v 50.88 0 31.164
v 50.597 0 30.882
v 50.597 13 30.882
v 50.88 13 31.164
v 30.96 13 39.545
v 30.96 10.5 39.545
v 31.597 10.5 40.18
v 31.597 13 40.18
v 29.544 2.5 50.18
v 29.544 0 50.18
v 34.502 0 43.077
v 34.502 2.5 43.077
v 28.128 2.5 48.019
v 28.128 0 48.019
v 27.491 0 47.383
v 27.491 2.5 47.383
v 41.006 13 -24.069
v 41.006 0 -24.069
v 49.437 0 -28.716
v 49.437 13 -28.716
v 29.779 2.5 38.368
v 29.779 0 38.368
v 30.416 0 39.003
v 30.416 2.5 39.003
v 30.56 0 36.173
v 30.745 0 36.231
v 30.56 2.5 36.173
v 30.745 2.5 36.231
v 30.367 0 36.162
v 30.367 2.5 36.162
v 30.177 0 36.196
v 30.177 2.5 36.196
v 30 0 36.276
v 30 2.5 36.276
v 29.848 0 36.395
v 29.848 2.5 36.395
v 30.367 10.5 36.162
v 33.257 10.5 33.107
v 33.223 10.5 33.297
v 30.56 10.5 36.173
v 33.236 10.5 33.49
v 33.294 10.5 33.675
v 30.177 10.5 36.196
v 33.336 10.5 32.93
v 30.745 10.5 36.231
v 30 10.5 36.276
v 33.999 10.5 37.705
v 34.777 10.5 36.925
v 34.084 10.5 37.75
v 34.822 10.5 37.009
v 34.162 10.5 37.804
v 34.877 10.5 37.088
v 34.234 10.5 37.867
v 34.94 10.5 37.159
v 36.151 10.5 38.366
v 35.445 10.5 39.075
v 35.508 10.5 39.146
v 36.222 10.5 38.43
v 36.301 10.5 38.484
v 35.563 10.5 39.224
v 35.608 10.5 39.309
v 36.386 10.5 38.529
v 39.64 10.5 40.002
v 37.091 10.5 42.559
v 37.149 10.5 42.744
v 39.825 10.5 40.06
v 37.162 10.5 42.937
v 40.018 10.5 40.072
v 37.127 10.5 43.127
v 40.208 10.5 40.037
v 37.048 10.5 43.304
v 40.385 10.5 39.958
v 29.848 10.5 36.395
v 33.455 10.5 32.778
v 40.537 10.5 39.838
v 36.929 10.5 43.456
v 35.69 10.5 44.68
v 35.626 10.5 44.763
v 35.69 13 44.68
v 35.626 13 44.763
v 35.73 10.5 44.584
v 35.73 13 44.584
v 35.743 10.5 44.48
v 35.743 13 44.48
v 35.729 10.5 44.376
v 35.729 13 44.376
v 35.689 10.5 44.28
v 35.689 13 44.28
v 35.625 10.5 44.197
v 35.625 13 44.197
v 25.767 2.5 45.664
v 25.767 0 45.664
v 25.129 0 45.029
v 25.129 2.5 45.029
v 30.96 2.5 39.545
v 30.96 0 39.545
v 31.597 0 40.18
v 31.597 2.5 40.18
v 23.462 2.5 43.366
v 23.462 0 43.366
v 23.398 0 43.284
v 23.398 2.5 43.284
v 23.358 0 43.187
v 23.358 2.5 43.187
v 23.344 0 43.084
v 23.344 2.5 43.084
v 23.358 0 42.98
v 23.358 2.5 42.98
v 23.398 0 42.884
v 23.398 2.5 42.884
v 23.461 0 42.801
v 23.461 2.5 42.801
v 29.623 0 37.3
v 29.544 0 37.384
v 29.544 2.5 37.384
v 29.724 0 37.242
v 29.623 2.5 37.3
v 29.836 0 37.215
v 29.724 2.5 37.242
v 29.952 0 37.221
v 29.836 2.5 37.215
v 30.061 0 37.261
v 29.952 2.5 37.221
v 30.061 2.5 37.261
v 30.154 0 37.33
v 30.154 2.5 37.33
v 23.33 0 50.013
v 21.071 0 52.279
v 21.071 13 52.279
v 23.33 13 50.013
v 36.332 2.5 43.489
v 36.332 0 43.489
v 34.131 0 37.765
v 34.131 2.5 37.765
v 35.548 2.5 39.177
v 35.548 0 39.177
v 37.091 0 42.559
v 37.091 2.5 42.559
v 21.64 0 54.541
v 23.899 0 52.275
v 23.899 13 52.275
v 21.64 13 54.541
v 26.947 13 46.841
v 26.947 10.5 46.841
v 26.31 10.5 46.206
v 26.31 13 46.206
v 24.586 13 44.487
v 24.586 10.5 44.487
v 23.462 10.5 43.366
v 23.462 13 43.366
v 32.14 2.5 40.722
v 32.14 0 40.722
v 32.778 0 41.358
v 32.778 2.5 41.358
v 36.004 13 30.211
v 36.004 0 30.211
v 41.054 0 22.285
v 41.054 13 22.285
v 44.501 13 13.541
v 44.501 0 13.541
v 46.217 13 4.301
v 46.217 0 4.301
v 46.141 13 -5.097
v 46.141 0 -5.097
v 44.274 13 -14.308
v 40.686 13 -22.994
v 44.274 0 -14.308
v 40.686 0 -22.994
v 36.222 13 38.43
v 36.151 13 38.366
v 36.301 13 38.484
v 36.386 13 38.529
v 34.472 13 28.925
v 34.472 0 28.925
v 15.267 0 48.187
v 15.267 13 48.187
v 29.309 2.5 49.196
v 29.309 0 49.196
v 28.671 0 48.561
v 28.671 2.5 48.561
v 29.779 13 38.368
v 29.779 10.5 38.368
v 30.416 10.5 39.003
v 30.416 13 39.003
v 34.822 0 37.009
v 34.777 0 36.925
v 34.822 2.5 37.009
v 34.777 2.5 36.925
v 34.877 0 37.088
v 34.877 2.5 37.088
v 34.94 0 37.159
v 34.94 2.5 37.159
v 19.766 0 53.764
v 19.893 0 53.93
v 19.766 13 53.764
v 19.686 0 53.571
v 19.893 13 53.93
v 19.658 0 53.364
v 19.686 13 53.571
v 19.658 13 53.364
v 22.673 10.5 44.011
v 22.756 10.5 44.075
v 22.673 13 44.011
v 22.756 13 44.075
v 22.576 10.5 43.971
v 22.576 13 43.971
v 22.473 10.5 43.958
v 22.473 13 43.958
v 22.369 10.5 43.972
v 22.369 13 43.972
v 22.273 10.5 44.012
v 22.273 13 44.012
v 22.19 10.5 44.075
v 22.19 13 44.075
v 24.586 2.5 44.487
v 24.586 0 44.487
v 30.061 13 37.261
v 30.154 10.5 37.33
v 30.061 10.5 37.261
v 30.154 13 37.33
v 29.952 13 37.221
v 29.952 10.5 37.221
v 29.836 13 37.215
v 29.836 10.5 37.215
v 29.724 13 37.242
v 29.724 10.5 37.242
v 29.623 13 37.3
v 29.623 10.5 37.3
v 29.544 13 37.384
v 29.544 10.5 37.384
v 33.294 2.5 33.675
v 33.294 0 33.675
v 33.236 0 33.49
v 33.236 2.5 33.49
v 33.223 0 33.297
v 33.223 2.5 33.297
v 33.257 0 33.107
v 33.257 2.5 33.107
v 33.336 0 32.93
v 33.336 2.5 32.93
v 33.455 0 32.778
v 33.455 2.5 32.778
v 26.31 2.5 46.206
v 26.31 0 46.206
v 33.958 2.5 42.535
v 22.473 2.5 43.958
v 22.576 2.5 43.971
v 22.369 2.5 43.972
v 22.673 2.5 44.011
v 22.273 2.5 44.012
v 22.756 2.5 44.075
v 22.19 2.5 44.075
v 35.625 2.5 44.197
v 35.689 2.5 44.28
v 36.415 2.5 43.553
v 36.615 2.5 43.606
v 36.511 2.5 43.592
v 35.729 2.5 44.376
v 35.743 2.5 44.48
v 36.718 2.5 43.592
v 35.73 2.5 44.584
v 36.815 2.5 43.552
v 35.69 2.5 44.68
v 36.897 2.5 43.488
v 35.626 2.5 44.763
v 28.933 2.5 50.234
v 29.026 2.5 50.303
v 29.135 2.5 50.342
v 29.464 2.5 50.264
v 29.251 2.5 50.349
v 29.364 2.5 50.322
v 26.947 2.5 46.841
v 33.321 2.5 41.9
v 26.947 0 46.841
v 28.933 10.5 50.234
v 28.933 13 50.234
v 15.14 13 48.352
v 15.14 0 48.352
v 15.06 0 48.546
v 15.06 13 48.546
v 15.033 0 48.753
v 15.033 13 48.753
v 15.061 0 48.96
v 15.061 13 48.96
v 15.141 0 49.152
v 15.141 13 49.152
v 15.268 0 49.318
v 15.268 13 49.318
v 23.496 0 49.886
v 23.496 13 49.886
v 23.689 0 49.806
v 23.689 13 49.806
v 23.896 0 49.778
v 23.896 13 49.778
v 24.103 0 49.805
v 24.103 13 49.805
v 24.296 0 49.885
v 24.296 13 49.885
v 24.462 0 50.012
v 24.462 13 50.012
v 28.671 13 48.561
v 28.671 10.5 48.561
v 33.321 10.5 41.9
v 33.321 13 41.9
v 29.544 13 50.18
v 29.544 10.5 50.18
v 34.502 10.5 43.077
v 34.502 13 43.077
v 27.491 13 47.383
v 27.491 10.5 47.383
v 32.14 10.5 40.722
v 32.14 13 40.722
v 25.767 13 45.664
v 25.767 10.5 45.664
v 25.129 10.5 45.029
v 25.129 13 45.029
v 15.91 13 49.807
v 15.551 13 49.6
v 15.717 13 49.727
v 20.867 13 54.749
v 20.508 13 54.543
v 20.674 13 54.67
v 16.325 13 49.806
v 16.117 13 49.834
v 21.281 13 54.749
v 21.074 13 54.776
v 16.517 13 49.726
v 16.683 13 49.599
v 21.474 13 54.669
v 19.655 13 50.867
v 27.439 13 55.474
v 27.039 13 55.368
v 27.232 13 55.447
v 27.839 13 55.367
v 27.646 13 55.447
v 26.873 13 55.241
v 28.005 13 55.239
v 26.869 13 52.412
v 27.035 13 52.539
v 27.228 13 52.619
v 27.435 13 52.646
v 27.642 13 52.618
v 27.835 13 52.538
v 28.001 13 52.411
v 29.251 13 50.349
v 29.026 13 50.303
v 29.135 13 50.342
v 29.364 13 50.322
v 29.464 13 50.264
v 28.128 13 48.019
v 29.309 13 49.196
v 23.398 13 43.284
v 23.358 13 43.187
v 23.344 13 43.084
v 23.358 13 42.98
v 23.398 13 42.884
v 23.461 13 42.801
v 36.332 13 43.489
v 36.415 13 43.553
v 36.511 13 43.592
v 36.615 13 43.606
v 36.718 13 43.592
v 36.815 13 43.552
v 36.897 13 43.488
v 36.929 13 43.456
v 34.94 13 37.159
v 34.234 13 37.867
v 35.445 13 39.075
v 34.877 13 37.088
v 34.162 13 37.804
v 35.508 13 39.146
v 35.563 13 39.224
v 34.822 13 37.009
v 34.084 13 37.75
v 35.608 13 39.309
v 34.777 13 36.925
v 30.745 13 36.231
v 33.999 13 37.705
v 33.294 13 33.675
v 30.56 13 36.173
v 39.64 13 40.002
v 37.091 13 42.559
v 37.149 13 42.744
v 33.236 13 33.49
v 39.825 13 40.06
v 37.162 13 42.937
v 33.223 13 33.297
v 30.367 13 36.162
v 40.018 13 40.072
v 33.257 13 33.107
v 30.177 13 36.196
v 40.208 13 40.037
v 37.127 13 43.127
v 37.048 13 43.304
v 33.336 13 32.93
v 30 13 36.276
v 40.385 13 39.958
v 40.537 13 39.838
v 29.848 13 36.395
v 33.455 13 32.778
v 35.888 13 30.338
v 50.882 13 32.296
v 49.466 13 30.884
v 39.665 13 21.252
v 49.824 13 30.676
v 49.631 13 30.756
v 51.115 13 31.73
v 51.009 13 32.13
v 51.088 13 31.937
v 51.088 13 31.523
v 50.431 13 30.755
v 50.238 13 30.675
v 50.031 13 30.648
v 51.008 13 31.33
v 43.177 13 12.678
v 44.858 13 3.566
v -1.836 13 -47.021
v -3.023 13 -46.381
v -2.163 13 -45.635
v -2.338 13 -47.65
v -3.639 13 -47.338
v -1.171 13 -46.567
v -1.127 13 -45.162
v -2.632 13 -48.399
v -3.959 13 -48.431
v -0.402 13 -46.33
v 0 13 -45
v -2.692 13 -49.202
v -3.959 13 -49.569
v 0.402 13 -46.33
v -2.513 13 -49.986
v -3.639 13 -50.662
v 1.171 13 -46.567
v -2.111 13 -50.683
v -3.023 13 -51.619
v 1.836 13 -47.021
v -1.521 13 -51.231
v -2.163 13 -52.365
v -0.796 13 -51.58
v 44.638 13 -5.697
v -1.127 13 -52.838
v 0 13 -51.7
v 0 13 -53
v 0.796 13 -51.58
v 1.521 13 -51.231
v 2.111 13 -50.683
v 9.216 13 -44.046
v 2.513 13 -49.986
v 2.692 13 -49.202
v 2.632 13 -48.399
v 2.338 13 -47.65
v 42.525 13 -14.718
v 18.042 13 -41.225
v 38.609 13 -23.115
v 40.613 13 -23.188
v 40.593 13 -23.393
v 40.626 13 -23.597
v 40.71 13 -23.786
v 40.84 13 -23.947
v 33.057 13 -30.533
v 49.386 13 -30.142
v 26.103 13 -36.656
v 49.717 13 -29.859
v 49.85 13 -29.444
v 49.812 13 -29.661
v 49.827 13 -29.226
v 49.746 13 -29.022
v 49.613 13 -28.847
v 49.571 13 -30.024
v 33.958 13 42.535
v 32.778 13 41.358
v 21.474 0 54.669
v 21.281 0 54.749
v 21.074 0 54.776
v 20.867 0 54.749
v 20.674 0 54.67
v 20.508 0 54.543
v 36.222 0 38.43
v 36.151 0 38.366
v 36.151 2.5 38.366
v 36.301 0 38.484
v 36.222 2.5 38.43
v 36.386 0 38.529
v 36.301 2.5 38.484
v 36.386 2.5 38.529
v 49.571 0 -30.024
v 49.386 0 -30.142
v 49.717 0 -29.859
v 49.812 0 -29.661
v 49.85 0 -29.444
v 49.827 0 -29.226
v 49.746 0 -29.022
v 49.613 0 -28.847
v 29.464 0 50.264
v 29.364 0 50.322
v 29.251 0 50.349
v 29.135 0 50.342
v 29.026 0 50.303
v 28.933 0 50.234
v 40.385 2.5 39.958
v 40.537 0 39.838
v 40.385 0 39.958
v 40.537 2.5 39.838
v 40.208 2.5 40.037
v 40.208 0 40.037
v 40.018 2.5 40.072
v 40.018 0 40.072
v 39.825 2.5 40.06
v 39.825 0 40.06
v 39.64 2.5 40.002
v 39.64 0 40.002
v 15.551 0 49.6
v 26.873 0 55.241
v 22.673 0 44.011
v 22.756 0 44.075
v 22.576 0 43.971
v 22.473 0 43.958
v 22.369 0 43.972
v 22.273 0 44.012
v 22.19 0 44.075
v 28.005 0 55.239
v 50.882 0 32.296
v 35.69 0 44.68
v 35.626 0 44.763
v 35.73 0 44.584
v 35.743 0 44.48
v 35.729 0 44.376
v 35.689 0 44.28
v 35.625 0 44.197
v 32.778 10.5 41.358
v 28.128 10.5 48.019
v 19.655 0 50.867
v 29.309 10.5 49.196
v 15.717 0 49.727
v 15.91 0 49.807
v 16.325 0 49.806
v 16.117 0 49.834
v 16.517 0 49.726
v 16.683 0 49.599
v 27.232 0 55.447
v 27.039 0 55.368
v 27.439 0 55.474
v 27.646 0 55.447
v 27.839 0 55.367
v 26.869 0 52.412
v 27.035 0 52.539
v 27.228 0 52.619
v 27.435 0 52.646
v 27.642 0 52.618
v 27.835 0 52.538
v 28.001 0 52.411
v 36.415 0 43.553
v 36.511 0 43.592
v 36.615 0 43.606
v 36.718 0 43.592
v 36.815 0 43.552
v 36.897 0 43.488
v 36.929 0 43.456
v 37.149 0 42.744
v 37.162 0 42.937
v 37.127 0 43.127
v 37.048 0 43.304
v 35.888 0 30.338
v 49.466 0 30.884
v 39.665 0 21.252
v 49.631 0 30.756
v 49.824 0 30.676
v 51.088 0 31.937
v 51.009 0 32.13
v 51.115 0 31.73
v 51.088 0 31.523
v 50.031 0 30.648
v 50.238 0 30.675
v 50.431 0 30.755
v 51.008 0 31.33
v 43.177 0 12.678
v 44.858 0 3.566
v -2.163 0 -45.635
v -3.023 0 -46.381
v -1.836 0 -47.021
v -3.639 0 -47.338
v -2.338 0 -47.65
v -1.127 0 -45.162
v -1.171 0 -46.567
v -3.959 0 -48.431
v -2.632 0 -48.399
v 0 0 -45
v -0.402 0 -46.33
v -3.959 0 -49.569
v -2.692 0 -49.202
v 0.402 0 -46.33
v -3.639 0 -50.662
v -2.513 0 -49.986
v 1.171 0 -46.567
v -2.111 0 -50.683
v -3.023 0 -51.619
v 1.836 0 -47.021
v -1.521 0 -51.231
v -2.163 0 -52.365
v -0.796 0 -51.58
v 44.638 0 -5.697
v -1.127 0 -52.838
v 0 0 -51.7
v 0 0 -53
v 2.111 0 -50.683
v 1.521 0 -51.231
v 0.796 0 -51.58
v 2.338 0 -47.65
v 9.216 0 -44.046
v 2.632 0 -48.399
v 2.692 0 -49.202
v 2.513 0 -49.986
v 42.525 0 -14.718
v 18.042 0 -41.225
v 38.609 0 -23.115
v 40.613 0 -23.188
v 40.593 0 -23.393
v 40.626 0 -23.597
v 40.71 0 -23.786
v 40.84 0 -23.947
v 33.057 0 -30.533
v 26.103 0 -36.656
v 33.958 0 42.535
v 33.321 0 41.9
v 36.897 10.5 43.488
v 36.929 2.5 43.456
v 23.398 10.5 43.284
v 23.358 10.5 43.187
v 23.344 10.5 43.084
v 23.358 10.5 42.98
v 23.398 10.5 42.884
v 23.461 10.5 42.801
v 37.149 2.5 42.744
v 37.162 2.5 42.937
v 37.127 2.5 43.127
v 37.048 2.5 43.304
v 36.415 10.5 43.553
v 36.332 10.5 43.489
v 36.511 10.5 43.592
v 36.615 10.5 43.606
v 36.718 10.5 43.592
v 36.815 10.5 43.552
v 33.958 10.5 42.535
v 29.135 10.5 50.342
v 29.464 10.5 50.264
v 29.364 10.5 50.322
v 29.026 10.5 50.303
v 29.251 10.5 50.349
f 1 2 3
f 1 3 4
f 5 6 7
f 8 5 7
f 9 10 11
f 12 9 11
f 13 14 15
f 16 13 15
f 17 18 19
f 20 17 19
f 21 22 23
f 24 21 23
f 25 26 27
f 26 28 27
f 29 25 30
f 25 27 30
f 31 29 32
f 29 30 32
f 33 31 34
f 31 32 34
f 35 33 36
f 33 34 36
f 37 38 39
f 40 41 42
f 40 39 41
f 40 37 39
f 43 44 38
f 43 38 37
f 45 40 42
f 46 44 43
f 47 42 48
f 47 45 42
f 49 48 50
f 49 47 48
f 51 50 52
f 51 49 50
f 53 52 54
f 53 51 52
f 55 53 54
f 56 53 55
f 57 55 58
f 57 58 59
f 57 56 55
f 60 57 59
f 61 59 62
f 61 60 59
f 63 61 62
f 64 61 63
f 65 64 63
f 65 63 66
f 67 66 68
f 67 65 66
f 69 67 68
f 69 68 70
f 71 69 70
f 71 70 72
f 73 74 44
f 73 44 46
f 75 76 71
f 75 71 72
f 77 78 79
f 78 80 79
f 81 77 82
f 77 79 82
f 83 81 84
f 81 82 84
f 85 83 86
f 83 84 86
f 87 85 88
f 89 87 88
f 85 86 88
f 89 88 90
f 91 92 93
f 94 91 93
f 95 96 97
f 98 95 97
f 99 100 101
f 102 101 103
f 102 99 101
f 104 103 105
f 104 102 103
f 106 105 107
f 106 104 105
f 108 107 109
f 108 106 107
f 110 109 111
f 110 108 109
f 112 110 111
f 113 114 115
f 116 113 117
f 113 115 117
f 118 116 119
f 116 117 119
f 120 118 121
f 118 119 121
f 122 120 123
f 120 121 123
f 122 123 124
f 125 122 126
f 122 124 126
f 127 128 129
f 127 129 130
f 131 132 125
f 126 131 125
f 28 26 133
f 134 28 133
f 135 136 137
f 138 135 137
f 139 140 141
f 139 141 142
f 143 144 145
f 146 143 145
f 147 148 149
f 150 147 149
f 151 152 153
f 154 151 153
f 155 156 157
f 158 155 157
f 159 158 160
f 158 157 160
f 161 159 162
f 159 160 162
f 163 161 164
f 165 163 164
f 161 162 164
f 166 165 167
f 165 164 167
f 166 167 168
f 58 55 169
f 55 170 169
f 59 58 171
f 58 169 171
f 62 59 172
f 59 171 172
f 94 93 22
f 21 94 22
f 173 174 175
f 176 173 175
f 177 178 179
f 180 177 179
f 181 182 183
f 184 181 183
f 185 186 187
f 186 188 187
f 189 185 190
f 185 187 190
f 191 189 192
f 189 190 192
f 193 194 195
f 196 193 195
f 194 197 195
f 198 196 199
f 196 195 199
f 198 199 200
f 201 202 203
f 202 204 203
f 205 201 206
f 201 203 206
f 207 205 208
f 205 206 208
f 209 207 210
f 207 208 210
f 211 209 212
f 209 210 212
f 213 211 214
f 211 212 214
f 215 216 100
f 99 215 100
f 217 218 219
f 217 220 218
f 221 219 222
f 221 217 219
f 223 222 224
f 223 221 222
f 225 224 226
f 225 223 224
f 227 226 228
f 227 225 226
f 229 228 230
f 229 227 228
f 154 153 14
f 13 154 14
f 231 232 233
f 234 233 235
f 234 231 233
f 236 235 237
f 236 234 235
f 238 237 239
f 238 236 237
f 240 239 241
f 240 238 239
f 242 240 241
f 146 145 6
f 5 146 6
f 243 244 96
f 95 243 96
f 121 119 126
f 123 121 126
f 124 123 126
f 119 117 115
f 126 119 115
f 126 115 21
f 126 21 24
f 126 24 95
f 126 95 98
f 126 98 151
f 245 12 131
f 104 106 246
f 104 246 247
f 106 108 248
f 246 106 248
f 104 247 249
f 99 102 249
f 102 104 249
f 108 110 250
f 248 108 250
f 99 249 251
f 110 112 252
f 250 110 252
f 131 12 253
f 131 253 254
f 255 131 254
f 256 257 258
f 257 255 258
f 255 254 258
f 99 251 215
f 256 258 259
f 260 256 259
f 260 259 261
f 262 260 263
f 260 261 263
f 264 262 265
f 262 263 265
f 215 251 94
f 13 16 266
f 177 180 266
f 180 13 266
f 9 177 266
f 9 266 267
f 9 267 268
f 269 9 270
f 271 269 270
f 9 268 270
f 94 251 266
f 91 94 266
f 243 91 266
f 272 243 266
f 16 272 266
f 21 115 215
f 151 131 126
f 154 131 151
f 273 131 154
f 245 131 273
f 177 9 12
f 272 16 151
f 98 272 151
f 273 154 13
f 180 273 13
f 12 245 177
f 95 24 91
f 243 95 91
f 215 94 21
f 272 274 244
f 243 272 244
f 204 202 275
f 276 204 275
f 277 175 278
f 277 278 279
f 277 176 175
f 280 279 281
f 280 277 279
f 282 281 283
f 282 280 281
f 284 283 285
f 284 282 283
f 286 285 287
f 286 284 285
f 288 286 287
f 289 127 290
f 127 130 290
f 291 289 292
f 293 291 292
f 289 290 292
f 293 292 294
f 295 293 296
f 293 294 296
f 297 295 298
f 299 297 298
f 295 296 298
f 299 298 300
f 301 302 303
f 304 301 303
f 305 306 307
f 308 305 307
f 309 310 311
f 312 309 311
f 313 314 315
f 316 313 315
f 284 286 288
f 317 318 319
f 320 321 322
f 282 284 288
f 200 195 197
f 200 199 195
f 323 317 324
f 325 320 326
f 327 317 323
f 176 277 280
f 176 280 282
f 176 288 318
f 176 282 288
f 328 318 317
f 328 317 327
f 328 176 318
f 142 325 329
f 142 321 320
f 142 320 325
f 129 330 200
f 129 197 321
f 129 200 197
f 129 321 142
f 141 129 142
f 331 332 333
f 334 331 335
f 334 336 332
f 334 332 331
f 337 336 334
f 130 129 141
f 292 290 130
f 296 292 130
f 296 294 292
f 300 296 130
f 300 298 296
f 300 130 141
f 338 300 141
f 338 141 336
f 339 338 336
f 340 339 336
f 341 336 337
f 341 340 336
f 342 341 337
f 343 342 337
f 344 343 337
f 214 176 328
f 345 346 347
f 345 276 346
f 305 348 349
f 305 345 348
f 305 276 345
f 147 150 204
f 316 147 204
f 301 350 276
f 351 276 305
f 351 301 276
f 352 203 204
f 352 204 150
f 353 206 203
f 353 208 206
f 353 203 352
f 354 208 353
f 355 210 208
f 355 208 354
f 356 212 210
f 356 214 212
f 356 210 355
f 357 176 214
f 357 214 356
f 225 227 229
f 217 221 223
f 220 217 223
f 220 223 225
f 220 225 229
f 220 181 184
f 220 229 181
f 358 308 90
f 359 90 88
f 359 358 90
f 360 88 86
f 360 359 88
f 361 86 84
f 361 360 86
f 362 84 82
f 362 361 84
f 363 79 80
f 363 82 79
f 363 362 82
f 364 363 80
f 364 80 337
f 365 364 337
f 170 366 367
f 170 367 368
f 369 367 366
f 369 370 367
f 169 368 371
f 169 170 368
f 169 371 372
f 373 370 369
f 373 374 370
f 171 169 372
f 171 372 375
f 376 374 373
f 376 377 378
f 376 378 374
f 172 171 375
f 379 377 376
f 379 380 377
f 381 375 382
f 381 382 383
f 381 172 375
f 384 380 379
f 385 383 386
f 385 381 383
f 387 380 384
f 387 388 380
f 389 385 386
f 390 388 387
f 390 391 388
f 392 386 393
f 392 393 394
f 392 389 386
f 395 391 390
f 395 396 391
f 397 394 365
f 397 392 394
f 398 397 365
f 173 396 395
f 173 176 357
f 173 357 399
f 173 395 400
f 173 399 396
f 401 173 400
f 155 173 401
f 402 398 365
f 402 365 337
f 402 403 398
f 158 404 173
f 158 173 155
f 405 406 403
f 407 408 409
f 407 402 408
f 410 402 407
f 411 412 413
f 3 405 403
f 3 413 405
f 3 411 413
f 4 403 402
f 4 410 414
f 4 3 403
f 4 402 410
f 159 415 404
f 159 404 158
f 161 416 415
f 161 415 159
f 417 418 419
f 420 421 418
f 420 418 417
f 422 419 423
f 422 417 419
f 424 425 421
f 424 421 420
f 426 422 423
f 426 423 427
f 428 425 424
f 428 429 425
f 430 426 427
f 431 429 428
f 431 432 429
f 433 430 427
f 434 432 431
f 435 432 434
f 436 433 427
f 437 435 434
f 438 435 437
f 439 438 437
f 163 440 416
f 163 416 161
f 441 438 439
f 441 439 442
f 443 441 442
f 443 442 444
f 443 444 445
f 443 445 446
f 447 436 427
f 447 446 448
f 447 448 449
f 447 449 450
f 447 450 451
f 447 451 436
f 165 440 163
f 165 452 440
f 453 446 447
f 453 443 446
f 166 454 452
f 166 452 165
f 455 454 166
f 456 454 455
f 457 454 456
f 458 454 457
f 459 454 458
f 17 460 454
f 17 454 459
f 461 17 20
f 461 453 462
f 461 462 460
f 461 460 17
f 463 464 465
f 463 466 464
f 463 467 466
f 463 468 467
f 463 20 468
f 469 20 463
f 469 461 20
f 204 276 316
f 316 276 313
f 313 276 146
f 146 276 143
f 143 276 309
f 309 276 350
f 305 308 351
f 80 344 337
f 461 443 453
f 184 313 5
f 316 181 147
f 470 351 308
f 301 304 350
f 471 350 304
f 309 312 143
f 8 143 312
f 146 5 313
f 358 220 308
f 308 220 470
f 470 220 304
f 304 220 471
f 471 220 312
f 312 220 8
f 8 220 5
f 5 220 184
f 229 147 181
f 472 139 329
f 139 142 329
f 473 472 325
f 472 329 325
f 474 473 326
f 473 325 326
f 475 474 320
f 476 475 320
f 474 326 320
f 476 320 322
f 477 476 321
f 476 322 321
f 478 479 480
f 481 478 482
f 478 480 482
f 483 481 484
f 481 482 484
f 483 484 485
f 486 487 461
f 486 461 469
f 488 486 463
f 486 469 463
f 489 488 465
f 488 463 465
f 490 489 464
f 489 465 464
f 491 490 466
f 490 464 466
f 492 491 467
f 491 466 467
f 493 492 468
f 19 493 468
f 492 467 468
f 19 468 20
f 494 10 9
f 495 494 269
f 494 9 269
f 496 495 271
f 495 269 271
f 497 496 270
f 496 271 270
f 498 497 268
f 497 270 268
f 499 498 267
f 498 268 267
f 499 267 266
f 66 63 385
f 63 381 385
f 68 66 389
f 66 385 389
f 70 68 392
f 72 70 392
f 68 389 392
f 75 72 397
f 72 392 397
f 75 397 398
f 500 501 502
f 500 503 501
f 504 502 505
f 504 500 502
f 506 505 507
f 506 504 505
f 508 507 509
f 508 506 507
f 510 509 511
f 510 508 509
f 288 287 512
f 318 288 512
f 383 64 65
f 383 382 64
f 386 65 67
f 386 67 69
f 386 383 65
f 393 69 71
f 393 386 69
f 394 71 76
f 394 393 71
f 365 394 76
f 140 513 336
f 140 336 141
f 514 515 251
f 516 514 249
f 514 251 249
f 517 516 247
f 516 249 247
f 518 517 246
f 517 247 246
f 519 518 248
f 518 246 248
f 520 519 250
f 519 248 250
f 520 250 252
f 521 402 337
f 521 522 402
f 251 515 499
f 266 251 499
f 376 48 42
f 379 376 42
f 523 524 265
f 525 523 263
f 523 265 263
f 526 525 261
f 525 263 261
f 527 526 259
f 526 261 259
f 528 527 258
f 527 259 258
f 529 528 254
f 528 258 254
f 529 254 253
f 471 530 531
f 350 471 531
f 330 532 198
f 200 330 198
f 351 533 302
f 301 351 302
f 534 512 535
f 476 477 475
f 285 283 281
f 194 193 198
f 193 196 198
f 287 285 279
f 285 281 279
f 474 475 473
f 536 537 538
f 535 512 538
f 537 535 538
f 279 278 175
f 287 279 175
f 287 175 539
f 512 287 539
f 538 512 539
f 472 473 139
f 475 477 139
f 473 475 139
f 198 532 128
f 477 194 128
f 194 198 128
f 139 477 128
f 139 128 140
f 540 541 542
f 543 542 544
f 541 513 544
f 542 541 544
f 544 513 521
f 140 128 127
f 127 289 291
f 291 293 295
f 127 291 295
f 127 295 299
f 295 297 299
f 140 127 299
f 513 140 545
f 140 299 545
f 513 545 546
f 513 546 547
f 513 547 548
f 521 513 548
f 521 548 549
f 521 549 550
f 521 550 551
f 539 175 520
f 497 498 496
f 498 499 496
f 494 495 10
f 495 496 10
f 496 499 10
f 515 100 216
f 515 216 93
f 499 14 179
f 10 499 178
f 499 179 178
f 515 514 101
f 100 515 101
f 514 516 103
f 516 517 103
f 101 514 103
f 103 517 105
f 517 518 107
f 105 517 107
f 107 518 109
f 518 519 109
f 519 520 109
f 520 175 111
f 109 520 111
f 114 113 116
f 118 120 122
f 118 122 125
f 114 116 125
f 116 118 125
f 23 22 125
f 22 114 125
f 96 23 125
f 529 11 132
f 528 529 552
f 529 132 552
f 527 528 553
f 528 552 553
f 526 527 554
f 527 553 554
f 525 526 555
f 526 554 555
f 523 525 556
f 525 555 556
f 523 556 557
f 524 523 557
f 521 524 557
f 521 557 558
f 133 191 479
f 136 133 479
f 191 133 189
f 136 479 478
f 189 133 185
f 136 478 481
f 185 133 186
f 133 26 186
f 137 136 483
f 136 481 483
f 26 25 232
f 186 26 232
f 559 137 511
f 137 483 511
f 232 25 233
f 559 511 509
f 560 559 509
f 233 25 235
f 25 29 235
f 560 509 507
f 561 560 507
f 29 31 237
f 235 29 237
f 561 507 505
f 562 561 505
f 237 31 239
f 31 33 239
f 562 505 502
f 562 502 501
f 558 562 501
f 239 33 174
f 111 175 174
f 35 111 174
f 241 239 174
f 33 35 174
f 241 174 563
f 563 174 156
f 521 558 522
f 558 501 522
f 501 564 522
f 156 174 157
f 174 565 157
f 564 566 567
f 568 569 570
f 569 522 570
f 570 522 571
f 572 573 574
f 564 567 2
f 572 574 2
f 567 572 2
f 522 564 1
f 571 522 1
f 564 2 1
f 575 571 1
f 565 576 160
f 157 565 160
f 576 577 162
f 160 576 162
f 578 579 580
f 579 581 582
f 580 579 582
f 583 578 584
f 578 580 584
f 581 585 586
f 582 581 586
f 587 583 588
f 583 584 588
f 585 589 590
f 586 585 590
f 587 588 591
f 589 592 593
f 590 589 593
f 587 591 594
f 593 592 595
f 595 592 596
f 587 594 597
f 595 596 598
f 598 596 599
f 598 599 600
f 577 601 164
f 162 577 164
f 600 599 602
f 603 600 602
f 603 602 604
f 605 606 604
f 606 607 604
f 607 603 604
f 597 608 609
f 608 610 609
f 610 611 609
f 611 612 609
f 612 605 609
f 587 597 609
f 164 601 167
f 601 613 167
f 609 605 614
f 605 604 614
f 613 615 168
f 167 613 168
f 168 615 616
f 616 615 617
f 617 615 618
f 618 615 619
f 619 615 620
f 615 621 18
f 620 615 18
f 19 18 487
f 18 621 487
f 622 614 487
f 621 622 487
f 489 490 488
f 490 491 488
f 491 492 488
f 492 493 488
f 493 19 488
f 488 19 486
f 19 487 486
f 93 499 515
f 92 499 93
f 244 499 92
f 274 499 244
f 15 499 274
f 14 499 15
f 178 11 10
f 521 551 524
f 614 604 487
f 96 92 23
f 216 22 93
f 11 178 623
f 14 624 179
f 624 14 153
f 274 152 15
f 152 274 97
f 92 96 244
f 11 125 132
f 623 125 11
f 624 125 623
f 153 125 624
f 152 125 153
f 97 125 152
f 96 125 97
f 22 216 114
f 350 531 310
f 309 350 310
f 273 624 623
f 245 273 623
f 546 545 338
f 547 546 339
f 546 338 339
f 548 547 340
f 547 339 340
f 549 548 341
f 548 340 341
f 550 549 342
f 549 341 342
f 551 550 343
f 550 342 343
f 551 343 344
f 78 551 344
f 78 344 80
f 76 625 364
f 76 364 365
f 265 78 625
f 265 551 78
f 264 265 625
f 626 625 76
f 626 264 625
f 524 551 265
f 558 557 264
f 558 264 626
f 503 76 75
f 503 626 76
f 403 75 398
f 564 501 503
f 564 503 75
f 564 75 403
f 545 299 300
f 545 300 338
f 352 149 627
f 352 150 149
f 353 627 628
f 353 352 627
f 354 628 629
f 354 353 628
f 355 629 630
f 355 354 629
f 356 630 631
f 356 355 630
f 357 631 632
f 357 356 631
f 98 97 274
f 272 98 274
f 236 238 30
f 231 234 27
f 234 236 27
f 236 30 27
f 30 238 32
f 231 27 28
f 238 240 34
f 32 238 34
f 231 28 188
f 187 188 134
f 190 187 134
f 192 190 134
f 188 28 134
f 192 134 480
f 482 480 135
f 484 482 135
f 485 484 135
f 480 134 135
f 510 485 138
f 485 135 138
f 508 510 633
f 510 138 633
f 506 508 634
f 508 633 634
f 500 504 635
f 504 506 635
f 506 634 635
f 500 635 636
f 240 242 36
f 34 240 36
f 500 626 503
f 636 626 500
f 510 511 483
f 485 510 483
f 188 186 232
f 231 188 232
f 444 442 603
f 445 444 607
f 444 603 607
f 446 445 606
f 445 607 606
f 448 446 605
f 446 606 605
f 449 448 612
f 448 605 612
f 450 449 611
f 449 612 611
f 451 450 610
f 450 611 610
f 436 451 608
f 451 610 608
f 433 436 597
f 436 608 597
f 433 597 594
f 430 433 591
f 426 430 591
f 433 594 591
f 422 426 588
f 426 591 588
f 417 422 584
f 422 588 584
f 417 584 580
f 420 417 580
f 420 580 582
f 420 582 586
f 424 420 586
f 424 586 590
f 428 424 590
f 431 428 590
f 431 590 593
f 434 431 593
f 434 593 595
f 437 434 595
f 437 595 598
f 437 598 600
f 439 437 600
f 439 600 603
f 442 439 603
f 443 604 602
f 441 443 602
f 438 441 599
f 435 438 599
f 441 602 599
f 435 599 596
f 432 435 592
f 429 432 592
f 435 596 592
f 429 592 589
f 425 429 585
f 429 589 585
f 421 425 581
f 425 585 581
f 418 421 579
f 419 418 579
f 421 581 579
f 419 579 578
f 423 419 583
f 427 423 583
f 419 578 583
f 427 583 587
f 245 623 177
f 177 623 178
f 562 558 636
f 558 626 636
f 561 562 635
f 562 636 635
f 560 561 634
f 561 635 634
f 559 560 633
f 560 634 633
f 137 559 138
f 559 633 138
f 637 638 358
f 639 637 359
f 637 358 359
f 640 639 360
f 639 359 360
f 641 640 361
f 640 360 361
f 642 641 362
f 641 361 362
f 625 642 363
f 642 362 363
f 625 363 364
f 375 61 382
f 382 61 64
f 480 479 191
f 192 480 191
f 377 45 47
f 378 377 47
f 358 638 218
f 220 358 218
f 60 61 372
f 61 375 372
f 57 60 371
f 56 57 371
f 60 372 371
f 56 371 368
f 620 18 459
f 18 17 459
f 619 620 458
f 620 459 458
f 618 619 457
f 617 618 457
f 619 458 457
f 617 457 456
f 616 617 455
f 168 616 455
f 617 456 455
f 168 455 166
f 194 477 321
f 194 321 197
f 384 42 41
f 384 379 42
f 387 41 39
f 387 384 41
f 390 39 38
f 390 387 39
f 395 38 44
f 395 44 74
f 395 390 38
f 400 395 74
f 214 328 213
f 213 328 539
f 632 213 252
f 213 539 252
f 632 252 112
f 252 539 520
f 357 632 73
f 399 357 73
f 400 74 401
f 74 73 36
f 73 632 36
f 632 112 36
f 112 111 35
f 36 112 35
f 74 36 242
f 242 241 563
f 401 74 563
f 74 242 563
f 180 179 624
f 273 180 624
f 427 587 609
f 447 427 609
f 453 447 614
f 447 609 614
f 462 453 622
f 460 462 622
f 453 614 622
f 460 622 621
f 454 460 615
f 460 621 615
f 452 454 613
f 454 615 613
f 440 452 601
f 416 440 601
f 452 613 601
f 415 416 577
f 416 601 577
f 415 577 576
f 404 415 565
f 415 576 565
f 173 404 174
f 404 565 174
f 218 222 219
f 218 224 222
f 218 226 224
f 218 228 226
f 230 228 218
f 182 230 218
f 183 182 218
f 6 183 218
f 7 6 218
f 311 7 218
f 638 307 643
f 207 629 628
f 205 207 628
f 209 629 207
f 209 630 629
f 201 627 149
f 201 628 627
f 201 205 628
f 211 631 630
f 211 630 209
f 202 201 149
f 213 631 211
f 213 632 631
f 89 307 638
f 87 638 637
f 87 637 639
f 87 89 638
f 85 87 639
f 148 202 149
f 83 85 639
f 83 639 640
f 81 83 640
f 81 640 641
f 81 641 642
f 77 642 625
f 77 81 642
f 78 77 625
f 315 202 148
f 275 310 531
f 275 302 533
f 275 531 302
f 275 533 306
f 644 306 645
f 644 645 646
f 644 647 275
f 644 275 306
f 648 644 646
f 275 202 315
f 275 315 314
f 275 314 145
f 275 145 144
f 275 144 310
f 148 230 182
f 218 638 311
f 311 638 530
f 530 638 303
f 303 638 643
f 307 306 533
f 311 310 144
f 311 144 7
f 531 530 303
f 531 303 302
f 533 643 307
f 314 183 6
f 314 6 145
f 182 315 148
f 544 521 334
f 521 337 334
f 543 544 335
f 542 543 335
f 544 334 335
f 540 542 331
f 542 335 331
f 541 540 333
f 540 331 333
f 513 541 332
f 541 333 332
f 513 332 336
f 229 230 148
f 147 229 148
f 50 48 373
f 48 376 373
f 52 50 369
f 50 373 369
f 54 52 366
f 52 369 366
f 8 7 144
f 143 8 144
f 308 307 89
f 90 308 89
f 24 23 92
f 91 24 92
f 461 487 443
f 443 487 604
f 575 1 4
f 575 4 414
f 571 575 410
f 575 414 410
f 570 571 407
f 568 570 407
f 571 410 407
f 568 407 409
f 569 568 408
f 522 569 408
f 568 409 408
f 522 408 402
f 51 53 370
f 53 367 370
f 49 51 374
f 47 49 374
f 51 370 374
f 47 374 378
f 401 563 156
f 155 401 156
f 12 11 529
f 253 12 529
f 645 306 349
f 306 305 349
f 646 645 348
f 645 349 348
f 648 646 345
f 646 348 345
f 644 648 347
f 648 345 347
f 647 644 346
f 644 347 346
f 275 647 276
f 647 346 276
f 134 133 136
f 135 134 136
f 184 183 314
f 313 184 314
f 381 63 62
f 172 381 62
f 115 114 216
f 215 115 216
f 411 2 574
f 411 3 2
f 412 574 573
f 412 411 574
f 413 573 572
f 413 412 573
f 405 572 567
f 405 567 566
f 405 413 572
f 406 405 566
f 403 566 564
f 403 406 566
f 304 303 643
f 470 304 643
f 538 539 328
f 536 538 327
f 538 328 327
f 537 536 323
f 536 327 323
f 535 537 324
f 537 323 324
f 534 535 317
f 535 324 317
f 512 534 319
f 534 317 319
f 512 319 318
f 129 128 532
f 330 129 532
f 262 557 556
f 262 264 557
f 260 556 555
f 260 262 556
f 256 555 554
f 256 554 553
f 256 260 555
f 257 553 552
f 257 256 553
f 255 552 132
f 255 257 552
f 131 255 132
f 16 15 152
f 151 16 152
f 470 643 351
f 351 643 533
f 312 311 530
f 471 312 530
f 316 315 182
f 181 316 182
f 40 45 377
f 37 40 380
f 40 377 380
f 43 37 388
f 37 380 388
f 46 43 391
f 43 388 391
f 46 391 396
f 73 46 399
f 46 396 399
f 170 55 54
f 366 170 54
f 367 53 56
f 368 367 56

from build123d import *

# Parameters (mm, degrees)
BOSS_EXTRUDE1_DEPTH = 13
SKETCH2_W           = 10
SKETCH2_H           = 8
CUT_EXTRUDE1_DEPTH  = 23
FILLET2_R           = 0.8
FILLET3_R           = 0.4


with BuildPart() as part:
    # Sketch1 → Boss-Extrude1 (new body)
    # profile 1 of 9: a face of its own
    with BuildSketch(Plane(origin=(0, 0, 0), x_dir=(1, 0, 0), z_dir=(0, 1, 0))):
        with BuildLine():
            Line((0, 51.69999999999999), (0, 52.99999999999999))
            ThreePointArc((-9.3e-16, 52.999999999999986), (-4.000000000000001, 48.999999999999986), (0, 44.999999999999986))
            ThreePointArc((0, 44.99999999999999), (40.783850416649216, 19.017821778331506), (34.47199994035405, -28.925442435894198))
            Line((34.47199994035406, -28.9254424358942), (35.888260603401996, -30.337605930077153))
            Line((35.888260603401996, -30.337605930077153), (36.00408882659202, -30.211017655267263))
            ThreePointArc((36.00408882659201, -30.211017655267256), (46.250188794991274, -3.909012128546492), (40.31112943915424, 23.686379393552375))
            ThreePointArc((40.31112943915424, 23.686379393552375), (24.563687739130117, 40.824426362915915), (2.690955139008132, 48.77918233801223))
            ThreePointArc((2.6909551390081288, 48.77918233801222), (-1.985725017136943, 47.17054758019878), (2.055e-14, 51.69999999999999))
        make_face()
    # profile 2 of 9: a face of its own
    with BuildSketch(Plane(origin=(0, 0, 0), x_dir=(1, 0, 0), z_dir=(0, 1, 0))):
        with BuildLine():
            Line((50.82068164403521, 29.47855622552852), (0, 52.99999999999999))
            Line((0, 52.99999999999999), (0, 51.69999999999999))
            ThreePointArc((2.115e-14, 51.69999999999999), (1.909188309203686, 50.90918830920366), (2.7, 48.999999999999986))
            ThreePointArc((2.7, 48.999999999999986), (2.6977378370888774, 48.88949858671026), (2.6909551390081288, 48.77918233801222))
            ThreePointArc((2.690955139008132, 48.77918233801223), (24.563687739130117, 40.824426362915915), (40.31112943915424, 23.686379393552375))
            Line((40.311129439154236, 23.68637939355237), (50.82068164403521, 29.47855622552852))
        make_face()
    # profile 3 of 9: a face of its own
    with BuildSketch(Plane(origin=(0, 0, 0), x_dir=(1, 0, 0), z_dir=(0, 1, 0))):
        Polygon((21.766625661572498, -44.50021256055632), (35.888260603401996, -30.337605930077153), (34.47199994035406, -28.9254424358942), (20.350364998524487, -43.08804906637342), align=None)
    # profile 4 of 9: a face of its own
    with BuildSketch(Plane(origin=(0, 0, 0), x_dir=(1, 0, 0), z_dir=(0, 1, 0))):
        Polygon((34.83733232049475, -37.056649741824835), (33.063933615036056, -33.170127256173025), (30.23960662667018, -36.00264858226883), (34.13125057340328, -37.76478007334881), (35.5475112364512, -39.17694356753177), (37.32090994190985, -43.063466053183646), (40.145236930275736, -40.230944727087746), (36.25359298354269, -38.468813236007804), align=None)
    # profile 5 of 9: a face of its own
    with BuildSketch(Plane(origin=(0, 0, 0), x_dir=(1, 0, 0), z_dir=(0, 1, 0))):
        Polygon((51.446642052604496, -31.729283579935103), (30.26418963986006, -52.973193525654075), (28.84792897681213, -51.56103003147111), (50.03038138955656, -30.317120085752126), align=None)
    # profile 6 of 9: a face of its own
    with BuildSketch(Plane(origin=(0, 0, 0), x_dir=(1, 0, 0), z_dir=(0, 1, 0))):
        Polygon((23.17878915575541, -43.08395189750844), (22.47270740866399, -43.792082229032346), (29.270758591293983, -50.57046700111064), (34.50173196536596, -43.07678265401291), (35.9087464477269, -44.47972671623149), (36.61482819481838, -43.77159638470753), (29.81677701218832, -36.993211612629345), (24.585803638116356, -44.48689595972706), align=None)
        Polygon((32.77765265760353, -41.35769101853769), (28.12789854731734, -48.01874377151343), (27.490581248945773, -47.38327019913109), (32.14033535923197, -40.722217446155355), align=None, mode=Mode.SUBTRACT)
        Polygon((31.596954354536543, -40.1804084146089), (26.947200244250347, -46.84146116758463), (26.309882945878776, -46.20598759520231), (30.959637056164965, -39.54493484222657), align=None, mode=Mode.SUBTRACT)
        Polygon((33.95835096067053, -42.534973622466474), (29.308596850384333, -49.196026375442216), (28.671279552012766, -48.560552803059885), (33.321033662298966, -41.89950005008415), align=None, mode=Mode.SUBTRACT)
        Polygon((30.416256051469542, -39.00312581068011), (25.766501941183353, -45.664178563655845), (25.129184642811783, -45.02870499127351), (29.778938753097975, -38.36765223829777), align=None, mode=Mode.SUBTRACT)
    # profile 7 of 9: a face of its own
    with BuildSketch(Plane(origin=(0, 0, 0), x_dir=(1, 0, 0), z_dir=(0, 1, 0))):
        Polygon((27.435765482629172, -52.977290694519034), (28.84792897681213, -51.56103003147111), (30.26418963986006, -52.973193525654075), (27.439862651494142, -55.805714851749926), (23.899210993874338, -52.27530611629255), (21.074884005508324, -55.10782744238849), (19.658623342460395, -53.69566394820553), (23.895113825009364, -49.446881959061656), align=None)
    # profile 8 of 9: a face of its own
    with BuildSketch(Plane(origin=(0, 0, 0), x_dir=(1, 0, 0), z_dir=(0, 1, 0))):
        Polygon((19.658623342460395, -53.69566394820553), (21.07078683664336, -52.27940328515759), (19.654526173595425, -50.86723979097463), align=None)
    # profile 9 of 9: a face of its own
    with BuildSketch(Plane(origin=(0, 0, 0), x_dir=(1, 0, 0), z_dir=(0, 1, 0))):
        Polygon((20.350364998524487, -43.08804906637342), (14.701711021792637, -48.753091718565145), (16.11797168484057, -50.165255212748114), (21.766625661572498, -44.50021256055632), align=None)
    extrude(amount=BOSS_EXTRUDE1_DEPTH)

    # Sketch2 → Cut-Extrude1 (cut)
    with BuildSketch(Plane(origin=(-10.69214872852209, 0, 10.723170305733387), x_dir=(0.7081303315239577, 0, 0.7060817470914894), z_dir=(-0.7060817470914894, 0, 0.7081303315239577))):
        with Locations((51.834395676587455, 6.499999999999998)):
            Rectangle(SKETCH2_W, SKETCH2_H)
    extrude(amount=-CUT_EXTRUDE1_DEPTH, mode=Mode.SUBTRACT)

    # Fillet2
    fillet2_edges = [part.edges().sort_by_distance(p)[0] for p in [
        (35.5475112364512, 11.75, 39.17694356753177),
        (34.13125057340328, 11.75, 37.76478007334881),
        (30.23960662667018, 11.75, 36.00264858226883),
        (37.32090994190983, 11.75, 43.06346605318363),
        (50.03038138955656, 6.5, 30.317120085752126),
        (51.446642052604496, 6.5, 31.729283579935103),
        (27.439862651494142, 6.5, 55.805714851749926),
        (21.074884005508324, 6.5, 55.10782744238849),
        (19.658623342460395, 6.5, 53.69566394820553),
        (23.895113825009364, 6.5, 49.446881959061656),
        (27.435765482629172, 6.5, 52.977290694519034),
        (16.11797168484057, 6.5, 50.165255212748114),
        (14.701711021792637, 6.5, 48.753091718565145),
        (50.82068164403521, 6.5, -29.47855622552852),
        (40.31112943915424, 6.5, -23.68637939355238),
        (33.063933615036056, 11.75, 33.170127256173025),
        (34.83733232049475, 11.75, 37.056649741824835),
        (36.25359298354269, 11.75, 38.468813236007804),
        (40.14523693027576, 11.75, 40.23094472708776),
        (33.063933615036056, 1.2499999999999993, 33.170127256173025),
        (34.83733232049475, 1.2499999999999993, 37.056649741824835),
        (36.25359298354269, 1.2499999999999993, 38.468813236007804),
        (40.14523693027576, 1.2499999999999993, 40.23094472708776),
        (30.23960662667018, 1.2499999999999993, 36.00264858226883),
        (37.32090994190983, 1.2499999999999993, 43.06346605318363),
    ]]
    fillet(fillet2_edges, radius=FILLET2_R)

    # Fillet3
    fillet3_edges = [part.edges().sort_by_distance(p)[0] for p in [
        (23.17878915575541, 11.75, 43.08395189750844),
        (29.81677701218832, 11.75, 36.993211612629345),
        (36.61482819481838, 11.75, 43.77159638470753),
        (35.9087464477269, 11.75, 44.47972671623149),
        (29.270758591293983, 11.75, 50.57046700111064),
        (22.472707408664043, 11.75, 43.7920822290324),
        (35.9087464477269, 1.2499999999999993, 44.47972671623149),
        (29.270758591293983, 1.2499999999999993, 50.57046700111064),
        (22.472707408664043, 1.2499999999999993, 43.7920822290324),
        (23.17878915575541, 1.2499999999999993, 43.08395189750844),
        (29.81677701218832, 1.2499999999999993, 36.993211612629345),
        (36.61482819481838, 1.2499999999999993, 43.77159638470753),
    ]]
    fillet(fillet3_edges, radius=FILLET3_R)


solid = part.part
